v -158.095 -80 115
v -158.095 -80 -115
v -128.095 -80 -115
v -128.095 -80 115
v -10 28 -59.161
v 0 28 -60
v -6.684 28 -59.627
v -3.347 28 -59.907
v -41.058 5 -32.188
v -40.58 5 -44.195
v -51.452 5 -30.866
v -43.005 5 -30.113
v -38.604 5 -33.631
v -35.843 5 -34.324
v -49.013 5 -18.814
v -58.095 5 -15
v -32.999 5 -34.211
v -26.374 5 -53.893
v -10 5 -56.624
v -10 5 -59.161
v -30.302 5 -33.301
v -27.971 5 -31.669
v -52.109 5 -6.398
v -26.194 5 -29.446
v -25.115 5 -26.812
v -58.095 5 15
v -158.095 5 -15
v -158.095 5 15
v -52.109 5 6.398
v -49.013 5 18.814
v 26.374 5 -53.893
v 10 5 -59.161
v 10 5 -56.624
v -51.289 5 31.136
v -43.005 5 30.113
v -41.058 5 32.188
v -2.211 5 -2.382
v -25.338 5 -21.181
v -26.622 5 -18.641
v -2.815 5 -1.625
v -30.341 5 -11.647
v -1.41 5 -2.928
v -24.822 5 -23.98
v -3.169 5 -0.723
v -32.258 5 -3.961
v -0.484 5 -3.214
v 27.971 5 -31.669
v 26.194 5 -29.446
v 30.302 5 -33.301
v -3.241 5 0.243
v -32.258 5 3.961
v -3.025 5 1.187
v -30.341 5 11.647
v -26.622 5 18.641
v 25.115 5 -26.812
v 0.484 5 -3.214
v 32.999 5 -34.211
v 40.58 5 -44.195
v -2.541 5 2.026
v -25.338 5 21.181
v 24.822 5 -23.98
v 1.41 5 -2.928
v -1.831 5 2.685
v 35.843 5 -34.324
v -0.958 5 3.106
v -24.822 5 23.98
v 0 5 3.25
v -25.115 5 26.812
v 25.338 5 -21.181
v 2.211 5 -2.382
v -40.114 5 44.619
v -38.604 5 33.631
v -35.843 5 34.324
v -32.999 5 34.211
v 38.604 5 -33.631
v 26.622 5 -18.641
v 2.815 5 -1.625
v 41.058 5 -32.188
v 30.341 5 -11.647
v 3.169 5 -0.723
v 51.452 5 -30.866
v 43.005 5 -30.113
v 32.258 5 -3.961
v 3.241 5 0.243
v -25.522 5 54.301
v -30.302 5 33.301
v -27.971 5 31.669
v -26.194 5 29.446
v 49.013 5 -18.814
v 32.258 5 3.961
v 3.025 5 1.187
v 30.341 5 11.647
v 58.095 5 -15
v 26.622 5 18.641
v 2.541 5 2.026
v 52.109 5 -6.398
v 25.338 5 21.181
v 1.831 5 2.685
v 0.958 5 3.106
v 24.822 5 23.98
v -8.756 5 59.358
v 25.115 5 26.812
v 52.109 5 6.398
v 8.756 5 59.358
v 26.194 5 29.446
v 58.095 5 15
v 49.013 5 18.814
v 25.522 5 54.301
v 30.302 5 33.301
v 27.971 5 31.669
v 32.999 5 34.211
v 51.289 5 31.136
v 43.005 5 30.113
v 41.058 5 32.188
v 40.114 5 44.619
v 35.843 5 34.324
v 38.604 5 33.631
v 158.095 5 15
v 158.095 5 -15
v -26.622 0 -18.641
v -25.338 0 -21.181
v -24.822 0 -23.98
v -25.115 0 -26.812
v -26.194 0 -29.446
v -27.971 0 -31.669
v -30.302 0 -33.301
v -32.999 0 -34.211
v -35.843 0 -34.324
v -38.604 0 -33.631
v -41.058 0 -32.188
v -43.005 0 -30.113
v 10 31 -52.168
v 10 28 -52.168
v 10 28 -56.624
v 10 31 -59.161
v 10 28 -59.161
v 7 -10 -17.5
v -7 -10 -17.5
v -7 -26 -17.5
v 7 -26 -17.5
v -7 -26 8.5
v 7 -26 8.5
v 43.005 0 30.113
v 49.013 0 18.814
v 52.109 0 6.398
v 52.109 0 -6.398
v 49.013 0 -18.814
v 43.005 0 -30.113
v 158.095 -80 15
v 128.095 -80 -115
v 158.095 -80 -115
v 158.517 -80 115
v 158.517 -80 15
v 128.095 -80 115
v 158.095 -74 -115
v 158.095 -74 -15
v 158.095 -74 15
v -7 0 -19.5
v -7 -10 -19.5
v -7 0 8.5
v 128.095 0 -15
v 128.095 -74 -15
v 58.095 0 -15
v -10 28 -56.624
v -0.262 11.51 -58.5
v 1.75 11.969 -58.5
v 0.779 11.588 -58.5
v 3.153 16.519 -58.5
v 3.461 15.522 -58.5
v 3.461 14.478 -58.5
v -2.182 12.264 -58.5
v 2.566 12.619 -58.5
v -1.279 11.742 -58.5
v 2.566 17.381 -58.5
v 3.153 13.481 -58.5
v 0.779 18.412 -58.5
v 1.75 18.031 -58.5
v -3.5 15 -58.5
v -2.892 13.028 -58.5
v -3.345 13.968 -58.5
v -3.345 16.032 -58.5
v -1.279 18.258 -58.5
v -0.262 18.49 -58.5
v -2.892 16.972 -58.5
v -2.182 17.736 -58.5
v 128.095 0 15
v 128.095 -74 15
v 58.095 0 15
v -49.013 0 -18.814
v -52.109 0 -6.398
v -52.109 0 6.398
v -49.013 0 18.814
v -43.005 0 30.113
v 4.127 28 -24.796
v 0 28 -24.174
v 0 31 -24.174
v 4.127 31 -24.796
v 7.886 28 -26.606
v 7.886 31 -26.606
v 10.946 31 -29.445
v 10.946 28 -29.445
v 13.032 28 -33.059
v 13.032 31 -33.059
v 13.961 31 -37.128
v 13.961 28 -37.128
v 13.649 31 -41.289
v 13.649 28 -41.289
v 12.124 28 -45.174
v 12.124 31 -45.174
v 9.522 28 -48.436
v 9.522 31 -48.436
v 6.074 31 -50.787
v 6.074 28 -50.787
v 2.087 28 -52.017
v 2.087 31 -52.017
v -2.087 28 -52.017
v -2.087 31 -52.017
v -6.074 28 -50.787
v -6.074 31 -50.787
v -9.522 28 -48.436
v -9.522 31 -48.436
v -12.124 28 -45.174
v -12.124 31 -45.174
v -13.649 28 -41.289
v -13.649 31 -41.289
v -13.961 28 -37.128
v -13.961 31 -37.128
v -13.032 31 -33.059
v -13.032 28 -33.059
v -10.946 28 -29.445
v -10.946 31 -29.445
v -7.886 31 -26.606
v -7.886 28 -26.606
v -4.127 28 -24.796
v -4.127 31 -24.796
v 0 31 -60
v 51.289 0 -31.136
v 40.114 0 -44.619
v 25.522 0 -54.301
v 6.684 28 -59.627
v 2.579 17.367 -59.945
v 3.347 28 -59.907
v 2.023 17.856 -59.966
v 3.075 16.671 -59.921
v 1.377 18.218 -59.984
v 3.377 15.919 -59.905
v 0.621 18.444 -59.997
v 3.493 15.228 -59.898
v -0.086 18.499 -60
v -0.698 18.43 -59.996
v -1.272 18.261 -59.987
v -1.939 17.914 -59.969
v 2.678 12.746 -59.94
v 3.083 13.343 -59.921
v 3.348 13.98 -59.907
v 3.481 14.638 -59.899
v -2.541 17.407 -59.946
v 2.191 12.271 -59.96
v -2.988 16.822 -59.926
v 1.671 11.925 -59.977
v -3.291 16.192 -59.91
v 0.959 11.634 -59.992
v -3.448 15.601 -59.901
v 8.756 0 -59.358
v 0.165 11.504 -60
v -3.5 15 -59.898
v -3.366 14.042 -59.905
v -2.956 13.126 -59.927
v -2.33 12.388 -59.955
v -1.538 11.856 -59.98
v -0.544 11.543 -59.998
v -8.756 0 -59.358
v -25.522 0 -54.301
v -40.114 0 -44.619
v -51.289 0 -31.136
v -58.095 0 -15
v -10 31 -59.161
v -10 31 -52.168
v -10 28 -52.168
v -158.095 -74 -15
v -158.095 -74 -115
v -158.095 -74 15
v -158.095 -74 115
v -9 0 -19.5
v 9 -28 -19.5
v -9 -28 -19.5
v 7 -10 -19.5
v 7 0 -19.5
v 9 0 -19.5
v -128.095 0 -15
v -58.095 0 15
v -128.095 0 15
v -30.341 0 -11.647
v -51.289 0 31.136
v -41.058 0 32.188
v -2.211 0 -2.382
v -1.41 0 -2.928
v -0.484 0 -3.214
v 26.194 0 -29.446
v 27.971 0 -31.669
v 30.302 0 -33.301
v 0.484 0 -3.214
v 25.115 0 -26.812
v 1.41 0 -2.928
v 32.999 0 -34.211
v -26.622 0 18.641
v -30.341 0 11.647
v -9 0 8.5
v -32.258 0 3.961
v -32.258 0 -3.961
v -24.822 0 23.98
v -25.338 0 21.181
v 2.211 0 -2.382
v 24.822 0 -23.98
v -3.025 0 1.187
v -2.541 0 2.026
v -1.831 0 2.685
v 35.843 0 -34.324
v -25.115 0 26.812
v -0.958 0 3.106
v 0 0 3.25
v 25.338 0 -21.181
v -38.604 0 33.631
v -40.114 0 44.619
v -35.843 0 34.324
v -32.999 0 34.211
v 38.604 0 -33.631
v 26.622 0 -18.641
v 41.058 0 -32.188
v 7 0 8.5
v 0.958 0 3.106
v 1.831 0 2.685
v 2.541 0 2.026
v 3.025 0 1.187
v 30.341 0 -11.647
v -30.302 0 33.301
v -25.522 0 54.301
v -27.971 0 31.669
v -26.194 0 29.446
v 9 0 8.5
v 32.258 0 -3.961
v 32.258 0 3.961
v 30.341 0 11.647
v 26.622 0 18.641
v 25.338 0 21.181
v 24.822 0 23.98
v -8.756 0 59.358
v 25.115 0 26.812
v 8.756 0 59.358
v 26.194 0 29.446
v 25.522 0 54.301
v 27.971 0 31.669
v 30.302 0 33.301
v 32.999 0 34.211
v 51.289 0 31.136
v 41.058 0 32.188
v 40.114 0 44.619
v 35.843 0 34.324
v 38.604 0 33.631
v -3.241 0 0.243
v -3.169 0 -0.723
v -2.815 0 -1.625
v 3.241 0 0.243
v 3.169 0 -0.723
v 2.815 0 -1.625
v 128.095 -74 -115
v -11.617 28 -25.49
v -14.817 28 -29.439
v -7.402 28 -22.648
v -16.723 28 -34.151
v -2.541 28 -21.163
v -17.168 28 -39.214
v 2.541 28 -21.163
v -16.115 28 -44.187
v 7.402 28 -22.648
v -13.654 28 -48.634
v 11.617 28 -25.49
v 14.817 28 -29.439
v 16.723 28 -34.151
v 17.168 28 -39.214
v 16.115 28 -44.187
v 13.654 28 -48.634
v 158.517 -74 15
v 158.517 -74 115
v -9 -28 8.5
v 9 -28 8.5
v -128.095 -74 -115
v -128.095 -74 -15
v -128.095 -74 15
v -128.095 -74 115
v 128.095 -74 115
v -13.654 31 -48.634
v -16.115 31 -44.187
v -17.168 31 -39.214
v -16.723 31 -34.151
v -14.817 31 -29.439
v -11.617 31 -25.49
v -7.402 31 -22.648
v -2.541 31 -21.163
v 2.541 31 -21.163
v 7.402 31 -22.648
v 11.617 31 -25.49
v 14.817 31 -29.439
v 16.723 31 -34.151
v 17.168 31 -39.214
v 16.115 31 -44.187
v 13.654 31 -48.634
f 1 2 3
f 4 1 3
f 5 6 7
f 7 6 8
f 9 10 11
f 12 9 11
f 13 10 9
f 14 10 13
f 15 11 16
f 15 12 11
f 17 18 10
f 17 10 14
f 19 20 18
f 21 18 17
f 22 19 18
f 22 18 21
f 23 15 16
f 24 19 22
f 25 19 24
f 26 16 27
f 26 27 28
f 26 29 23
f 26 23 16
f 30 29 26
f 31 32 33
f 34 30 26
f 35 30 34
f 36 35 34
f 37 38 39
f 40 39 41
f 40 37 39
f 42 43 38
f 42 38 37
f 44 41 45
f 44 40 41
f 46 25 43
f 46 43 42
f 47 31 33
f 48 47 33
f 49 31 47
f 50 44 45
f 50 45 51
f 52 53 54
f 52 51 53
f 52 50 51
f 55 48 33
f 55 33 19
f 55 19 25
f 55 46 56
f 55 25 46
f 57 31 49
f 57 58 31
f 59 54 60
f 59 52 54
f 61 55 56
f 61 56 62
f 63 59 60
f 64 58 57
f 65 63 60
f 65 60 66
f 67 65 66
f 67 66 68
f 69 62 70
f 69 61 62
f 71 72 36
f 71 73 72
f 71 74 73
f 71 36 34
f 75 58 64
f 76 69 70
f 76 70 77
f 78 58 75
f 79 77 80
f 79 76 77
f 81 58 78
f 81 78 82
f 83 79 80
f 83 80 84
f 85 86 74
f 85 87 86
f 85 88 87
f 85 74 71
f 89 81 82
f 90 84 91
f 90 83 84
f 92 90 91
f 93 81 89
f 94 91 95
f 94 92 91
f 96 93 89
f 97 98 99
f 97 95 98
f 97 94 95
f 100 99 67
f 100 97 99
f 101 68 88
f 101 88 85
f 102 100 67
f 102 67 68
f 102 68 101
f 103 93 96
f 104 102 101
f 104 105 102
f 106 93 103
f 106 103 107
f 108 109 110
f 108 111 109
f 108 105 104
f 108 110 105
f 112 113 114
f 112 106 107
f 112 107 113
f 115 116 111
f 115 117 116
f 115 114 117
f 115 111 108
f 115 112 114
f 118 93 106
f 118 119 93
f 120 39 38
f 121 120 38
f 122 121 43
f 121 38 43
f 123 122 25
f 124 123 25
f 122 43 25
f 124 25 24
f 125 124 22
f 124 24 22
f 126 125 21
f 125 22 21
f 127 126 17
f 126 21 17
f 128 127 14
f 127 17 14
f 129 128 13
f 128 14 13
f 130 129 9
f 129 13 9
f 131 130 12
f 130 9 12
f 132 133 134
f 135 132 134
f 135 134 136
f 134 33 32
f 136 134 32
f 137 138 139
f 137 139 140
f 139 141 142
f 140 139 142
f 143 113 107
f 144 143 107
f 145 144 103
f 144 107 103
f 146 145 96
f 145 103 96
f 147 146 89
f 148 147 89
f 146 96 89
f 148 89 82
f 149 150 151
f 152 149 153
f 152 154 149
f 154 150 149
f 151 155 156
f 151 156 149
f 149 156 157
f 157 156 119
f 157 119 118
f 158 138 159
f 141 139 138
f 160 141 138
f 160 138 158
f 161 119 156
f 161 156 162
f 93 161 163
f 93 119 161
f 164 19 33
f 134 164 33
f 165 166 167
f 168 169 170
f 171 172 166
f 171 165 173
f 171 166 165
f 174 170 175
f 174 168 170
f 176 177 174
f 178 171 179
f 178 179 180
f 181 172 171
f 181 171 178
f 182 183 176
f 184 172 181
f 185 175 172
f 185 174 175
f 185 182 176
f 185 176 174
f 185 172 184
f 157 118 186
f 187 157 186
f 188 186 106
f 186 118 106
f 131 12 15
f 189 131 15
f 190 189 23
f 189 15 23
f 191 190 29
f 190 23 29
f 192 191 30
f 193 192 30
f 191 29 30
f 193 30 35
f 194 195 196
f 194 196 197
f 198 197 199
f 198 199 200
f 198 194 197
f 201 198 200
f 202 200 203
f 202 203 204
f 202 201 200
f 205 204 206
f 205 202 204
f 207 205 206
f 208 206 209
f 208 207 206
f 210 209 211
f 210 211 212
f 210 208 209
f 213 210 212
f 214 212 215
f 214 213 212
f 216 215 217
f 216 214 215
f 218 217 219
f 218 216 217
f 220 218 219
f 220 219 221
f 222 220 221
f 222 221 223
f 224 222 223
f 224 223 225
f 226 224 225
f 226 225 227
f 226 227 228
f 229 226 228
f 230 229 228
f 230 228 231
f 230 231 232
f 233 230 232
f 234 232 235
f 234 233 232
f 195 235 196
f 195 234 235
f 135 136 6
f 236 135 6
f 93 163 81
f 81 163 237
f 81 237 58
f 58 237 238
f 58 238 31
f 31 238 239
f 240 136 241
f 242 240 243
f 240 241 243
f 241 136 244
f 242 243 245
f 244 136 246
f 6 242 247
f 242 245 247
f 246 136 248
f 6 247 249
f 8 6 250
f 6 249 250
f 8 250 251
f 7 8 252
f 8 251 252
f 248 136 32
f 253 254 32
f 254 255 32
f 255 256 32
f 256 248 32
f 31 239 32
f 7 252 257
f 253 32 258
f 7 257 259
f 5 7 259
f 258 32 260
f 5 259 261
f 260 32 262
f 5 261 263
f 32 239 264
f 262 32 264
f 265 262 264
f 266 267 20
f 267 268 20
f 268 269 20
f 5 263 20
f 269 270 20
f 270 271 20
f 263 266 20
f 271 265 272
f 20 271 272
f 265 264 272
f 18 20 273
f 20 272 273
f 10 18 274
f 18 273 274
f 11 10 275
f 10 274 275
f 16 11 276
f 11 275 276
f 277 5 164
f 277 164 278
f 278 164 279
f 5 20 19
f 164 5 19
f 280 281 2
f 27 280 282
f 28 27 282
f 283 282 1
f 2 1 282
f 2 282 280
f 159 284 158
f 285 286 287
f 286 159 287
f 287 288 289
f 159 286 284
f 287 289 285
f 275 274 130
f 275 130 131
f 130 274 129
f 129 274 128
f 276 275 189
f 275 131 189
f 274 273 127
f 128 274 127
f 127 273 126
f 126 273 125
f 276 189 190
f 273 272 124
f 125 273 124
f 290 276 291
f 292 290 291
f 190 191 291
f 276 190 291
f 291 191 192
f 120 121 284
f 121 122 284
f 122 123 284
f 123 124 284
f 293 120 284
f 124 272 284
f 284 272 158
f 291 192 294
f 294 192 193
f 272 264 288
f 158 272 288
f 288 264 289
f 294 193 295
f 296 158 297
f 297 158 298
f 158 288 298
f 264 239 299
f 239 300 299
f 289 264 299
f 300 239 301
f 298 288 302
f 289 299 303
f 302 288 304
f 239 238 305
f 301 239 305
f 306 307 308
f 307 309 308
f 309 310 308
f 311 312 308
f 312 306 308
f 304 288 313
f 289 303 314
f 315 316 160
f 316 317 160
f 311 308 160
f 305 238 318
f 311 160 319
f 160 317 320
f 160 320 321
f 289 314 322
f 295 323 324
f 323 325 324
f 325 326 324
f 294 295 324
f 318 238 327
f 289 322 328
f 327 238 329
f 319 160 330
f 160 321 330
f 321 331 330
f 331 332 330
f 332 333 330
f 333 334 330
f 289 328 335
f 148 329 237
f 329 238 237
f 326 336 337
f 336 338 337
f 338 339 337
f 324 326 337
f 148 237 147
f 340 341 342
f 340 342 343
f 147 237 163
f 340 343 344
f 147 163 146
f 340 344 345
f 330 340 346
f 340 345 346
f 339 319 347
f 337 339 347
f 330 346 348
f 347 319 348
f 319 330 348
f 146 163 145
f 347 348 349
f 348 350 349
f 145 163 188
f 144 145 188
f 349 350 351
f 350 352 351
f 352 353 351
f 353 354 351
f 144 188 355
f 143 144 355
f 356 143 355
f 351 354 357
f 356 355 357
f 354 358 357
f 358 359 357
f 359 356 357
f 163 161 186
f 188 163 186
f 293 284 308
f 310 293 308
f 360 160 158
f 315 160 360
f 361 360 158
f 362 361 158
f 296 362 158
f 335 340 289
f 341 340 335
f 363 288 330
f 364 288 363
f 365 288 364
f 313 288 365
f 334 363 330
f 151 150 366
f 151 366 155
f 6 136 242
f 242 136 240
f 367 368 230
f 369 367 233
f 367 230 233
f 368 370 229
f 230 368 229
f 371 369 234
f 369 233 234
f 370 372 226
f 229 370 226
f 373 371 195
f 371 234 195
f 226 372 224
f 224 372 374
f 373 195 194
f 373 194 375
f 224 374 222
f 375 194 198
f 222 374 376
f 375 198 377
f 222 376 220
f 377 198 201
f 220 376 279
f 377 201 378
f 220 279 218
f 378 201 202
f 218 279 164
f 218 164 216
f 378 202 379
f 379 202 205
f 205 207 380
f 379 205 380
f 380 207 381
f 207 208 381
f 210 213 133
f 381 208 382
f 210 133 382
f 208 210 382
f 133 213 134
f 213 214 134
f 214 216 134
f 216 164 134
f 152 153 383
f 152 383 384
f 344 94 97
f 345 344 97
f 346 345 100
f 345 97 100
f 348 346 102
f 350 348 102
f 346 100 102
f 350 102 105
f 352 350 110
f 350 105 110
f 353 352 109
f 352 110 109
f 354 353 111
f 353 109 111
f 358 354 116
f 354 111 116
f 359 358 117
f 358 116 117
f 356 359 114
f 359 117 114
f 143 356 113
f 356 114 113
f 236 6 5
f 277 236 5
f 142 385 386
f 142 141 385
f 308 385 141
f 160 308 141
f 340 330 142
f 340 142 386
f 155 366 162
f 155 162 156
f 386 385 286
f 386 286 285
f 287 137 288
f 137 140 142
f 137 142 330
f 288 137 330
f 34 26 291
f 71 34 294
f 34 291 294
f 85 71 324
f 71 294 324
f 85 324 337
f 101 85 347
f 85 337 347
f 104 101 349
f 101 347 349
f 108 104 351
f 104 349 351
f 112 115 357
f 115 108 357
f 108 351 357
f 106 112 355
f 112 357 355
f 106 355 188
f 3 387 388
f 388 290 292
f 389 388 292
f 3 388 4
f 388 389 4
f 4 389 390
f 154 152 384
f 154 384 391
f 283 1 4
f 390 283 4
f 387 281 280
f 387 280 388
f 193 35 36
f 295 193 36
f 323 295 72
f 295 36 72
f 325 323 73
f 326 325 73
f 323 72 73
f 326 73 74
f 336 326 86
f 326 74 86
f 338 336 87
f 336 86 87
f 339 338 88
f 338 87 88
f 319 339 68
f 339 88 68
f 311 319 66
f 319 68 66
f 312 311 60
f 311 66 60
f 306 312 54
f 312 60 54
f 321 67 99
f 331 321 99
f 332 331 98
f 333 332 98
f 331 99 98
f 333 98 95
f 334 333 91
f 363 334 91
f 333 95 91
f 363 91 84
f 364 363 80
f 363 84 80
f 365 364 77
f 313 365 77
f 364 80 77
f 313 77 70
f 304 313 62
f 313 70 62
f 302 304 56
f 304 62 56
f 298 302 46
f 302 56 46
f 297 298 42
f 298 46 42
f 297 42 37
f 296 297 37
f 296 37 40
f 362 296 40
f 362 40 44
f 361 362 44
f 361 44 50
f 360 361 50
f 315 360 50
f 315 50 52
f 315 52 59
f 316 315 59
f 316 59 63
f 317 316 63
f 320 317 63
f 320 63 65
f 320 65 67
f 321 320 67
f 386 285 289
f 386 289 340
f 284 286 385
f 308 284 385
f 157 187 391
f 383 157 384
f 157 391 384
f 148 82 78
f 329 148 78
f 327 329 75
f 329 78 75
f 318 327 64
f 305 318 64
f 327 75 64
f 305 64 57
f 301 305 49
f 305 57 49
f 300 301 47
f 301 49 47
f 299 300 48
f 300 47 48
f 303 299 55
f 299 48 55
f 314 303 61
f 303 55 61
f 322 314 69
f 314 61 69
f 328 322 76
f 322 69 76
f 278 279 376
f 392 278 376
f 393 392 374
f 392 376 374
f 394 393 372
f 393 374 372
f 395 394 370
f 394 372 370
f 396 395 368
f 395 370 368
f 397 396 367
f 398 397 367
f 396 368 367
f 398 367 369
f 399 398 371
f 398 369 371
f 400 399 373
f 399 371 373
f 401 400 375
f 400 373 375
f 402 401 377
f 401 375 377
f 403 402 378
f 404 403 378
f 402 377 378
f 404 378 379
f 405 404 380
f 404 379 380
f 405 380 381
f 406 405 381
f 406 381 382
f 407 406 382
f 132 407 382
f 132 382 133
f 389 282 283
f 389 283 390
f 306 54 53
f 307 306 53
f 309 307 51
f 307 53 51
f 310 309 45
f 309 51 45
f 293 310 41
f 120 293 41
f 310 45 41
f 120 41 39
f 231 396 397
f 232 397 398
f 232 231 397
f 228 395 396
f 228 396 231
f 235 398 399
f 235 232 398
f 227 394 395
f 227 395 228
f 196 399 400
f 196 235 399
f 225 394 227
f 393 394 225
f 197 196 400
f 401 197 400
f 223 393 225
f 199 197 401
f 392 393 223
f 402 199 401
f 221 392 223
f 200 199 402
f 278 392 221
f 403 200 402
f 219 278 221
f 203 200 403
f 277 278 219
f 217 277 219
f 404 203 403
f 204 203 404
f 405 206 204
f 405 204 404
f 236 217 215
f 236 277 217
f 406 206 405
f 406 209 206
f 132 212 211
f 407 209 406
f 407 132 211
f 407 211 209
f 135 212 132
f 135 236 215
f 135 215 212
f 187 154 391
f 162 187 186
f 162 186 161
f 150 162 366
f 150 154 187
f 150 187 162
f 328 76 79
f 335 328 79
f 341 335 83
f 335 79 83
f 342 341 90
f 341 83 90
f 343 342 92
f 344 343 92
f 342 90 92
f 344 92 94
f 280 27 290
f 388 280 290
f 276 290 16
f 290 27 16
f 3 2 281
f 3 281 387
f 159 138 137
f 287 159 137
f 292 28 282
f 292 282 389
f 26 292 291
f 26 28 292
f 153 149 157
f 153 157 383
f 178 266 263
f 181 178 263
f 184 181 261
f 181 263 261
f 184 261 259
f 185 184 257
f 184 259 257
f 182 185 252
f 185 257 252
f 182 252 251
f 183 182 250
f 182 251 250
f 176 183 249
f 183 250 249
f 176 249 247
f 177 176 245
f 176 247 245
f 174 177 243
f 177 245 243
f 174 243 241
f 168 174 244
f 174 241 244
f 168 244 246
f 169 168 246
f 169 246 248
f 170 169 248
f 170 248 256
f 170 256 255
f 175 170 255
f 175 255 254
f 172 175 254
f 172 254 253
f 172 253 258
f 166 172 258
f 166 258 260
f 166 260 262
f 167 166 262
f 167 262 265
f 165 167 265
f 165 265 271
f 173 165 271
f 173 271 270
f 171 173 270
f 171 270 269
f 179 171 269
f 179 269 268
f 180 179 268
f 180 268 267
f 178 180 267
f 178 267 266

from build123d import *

# Parameters (mm, degrees)
SKETCH1_R            = 60
BOSS_EXTRUDE1_DEPTH  = 5
CUT_EXTRUDE1_DEPTH   = 5
BOSS_EXTRUDE2_DEPTH  = 23
SKETCH4_R            = 3.25
CUT_EXTRUDE2_DEPTH   = 15
BOSS_EXTRUDE3_START  = -5
BOSS_EXTRUDE3_DEPTH  = 5
SKETCH6_W            = 30
SKETCH6_H            = 30
BOSS_EXTRUDE4_DEPTH  = 80
SKETCH10_R           = 14
BOSS_EXTRUDE6_DEPTH  = 3
SKETCH7_W            = 18
SKETCH7_H            = 28
BOSS_EXTRUDE9_DEPTH  = 28
SKETCH15_W           = 14
SKETCH15_H           = 26
CUT_EXTRUDE3_DEPTH   = 26
SKETCH16_W           = 14
SKETCH16_H           = 10
CUT_EXTRUDE4_DEPTH   = 2
SKETCH12_W           = 30
SKETCH12_H           = 100
BOSS_EXTRUDE11_DEPTH = 6
SKETCH17_R           = 3.5
CUT_EXTRUDE5_DEPTH   = 1.5


with BuildPart() as part:
    # Sketch1 → Boss-Extrude1 (new body)
    with BuildSketch(Plane(origin=(0, 0, 0), x_dir=(1, 0, 0), z_dir=(0, 1, 0))):
        with Locations(Location((0, 0, 0), (0, 0, 270))):
            Circle(SKETCH1_R)
    extrude(amount=BOSS_EXTRUDE1_DEPTH)

    # Sketch2 → Cut-Extrude1 (cut)
    with BuildSketch(Plane(origin=(0, 5, 0), x_dir=(1, 0, 0), z_dir=(0, 1, 0))):
        with BuildLine():
            ThreePointArc((-43.005482325, 30.112762908), (-52.5, 0), (-43.005482325, -30.112762908))
            ThreePointArc((-43.005482325, -30.112762908), (-29.078197519, -32.568518988), (-26.622441439, -18.641234181))
            ThreePointArc((-26.622441439, -18.641234181), (-32.5, 0), (-26.622441439, 18.641234181))
            ThreePointArc((-26.622441439, 18.641234181), (-29.078197519, 32.568518988), (-43.005482325, 30.112762908))
        make_face()
        with BuildLine():
            ThreePointArc((43.005482325, 30.112762908), (29.078197519, 32.568518988), (26.622441439, 18.641234181))
            ThreePointArc((26.622441439, 18.641234181), (32.5, 0), (26.622441439, -18.641234181))
            ThreePointArc((26.622441439, -18.641234181), (29.078197519, -32.568518988), (43.005482325, -30.112762908))
            ThreePointArc((43.005482325, -30.112762908), (52.5, 0), (43.005482325, 30.112762908))
        make_face()
    extrude(amount=-CUT_EXTRUDE1_DEPTH, mode=Mode.SUBTRACT)

    # Sketch3 → Boss-Extrude2 (add)
    with BuildSketch(Plane(origin=(0, 5, 0), x_dir=(1, 0, 0), z_dir=(0, 1, 0))):
        with BuildLine():
            Line((10, 56.623758265), (10, 59.160797831))
            ThreePointArc((10, 59.160797831), (0, 60), (-10, 59.160797831))
            Line((-10, 59.160797831), (-10, 56.623758265))
            Line((-10, 56.623758265), (10, 56.623758265))
        make_face()
    extrude(amount=BOSS_EXTRUDE2_DEPTH)

    # Sketch4 → Cut-Extrude2 (cut)
    with BuildSketch(Plane(origin=(0, 5, 0), x_dir=(1, 0, 0), z_dir=(0, 1, 0))):
        with Locations(Location((0, 0, 0), (0, 0, 270))):
            Circle(SKETCH4_R)
    extrude(amount=-CUT_EXTRUDE2_DEPTH, mode=Mode.SUBTRACT)

    # Sketch5 → Boss-Extrude3 (add)
    with BuildSketch(Plane(origin=(0, 5, 0), x_dir=(1, 0, 0), z_dir=(0, 1, 0)).offset(BOSS_EXTRUDE3_START)):
        with BuildLine():
            Line((-58.094750193, 15), (-158.094750193, 15))
            Line((-158.094750193, 15), (-158.094750193, -15))
            Line((-158.094750193, -15), (-58.094750193, -15))
            ThreePointArc((-58.094750193, -15), (-60, 0), (-58.094750193, 15))
        make_face()
    boss_extrude3 = extrude(amount=BOSS_EXTRUDE3_DEPTH)

    # Mirror1: Boss-Extrude3 across plane
    add(boss_extrude3.mirror(Plane(origin=(0, 0, 0), x_dir=(0, 0, 1), z_dir=(1, 0, 0))))

    # Sketch6 → Boss-Extrude4 (add)
    with BuildSketch(Plane.XZ):
        with Locations((-143.094750193, 0)):
            Rectangle(SKETCH6_W, SKETCH6_H)
    boss_extrude4 = extrude(amount=BOSS_EXTRUDE4_DEPTH)

    # Mirror2: Boss-Extrude4 across plane
    add(boss_extrude4.mirror(Plane(origin=(0, 0, 0), x_dir=(0, 0, 1), z_dir=(1, 0, 0))))

    # Sketch10 → Boss-Extrude6 (add)
    with BuildSketch(Plane(origin=(0, 28, 0), x_dir=(1, 0, 0), z_dir=(0, 1, 0))):
        with BuildLine():
            Line((-10, 59.160797831), (-10, 52.168042812))
            ThreePointArc((-10, 52.168042812), (0, 20.973758265), (10, 52.168042812))
            Line((10, 52.168042812), (10, 59.160797831))
            Line((10, 59.160797831), (0, 60))
            Line((0, 60), (-10, 59.160797831))
        make_face()
        with Locations(Location((0, 38.173758265, 0), (0, 0, 270))):
            Circle(SKETCH10_R, mode=Mode.SUBTRACT)
    extrude(amount=BOSS_EXTRUDE6_DEPTH)

    # Sketch7 → Boss-Extrude9 (add)
    with BuildSketch(Plane.XZ):
        with Locations((0, -5.5)):
            Rectangle(SKETCH7_W, SKETCH7_H)
    extrude(amount=BOSS_EXTRUDE9_DEPTH)

    # Sketch15 → Cut-Extrude3 (cut)
    with BuildSketch(Plane.XY.offset(8.5)):
        with Locations((0, -13)):
            Rectangle(SKETCH15_W, SKETCH15_H)
    extrude(amount=-CUT_EXTRUDE3_DEPTH, mode=Mode.SUBTRACT)

    # Sketch16 → Cut-Extrude4 (cut)
    with BuildSketch(Plane.XY.offset(-17.5)):
        with Locations((0, -5)):
            Rectangle(SKETCH16_W, SKETCH16_H)
    extrude(amount=-CUT_EXTRUDE4_DEPTH, mode=Mode.SUBTRACT)

    # Sketch12 → Boss-Extrude11 (add)
    with BuildSketch(Plane.XZ.offset(80)):
        Polygon((128.094750193, 115), (128.094750193, 15), (158.094750193, 15), (158.516628994, 15), (158.516628994, 115), align=None)
        with Locations((143.094750193, -65)):
            Rectangle(SKETCH12_W, SKETCH12_H)
        with Locations((-143.094750193, 65)):
            Rectangle(SKETCH12_W, SKETCH12_H)
        with Locations((-143.094750193, -65)):
            Rectangle(SKETCH12_W, SKETCH12_H)
    extrude(amount=-BOSS_EXTRUDE11_DEPTH)

    # Sketch17 → Cut-Extrude5 (cut)
    with BuildSketch(Plane(origin=(0, 0, -60), x_dir=(-1, 0, 0), z_dir=(0, 0, -1))):
        with Locations((0, 15)):
            Circle(SKETCH17_R)
    extrude(amount=-CUT_EXTRUDE5_DEPTH, mode=Mode.SUBTRACT)


solid = part.part
